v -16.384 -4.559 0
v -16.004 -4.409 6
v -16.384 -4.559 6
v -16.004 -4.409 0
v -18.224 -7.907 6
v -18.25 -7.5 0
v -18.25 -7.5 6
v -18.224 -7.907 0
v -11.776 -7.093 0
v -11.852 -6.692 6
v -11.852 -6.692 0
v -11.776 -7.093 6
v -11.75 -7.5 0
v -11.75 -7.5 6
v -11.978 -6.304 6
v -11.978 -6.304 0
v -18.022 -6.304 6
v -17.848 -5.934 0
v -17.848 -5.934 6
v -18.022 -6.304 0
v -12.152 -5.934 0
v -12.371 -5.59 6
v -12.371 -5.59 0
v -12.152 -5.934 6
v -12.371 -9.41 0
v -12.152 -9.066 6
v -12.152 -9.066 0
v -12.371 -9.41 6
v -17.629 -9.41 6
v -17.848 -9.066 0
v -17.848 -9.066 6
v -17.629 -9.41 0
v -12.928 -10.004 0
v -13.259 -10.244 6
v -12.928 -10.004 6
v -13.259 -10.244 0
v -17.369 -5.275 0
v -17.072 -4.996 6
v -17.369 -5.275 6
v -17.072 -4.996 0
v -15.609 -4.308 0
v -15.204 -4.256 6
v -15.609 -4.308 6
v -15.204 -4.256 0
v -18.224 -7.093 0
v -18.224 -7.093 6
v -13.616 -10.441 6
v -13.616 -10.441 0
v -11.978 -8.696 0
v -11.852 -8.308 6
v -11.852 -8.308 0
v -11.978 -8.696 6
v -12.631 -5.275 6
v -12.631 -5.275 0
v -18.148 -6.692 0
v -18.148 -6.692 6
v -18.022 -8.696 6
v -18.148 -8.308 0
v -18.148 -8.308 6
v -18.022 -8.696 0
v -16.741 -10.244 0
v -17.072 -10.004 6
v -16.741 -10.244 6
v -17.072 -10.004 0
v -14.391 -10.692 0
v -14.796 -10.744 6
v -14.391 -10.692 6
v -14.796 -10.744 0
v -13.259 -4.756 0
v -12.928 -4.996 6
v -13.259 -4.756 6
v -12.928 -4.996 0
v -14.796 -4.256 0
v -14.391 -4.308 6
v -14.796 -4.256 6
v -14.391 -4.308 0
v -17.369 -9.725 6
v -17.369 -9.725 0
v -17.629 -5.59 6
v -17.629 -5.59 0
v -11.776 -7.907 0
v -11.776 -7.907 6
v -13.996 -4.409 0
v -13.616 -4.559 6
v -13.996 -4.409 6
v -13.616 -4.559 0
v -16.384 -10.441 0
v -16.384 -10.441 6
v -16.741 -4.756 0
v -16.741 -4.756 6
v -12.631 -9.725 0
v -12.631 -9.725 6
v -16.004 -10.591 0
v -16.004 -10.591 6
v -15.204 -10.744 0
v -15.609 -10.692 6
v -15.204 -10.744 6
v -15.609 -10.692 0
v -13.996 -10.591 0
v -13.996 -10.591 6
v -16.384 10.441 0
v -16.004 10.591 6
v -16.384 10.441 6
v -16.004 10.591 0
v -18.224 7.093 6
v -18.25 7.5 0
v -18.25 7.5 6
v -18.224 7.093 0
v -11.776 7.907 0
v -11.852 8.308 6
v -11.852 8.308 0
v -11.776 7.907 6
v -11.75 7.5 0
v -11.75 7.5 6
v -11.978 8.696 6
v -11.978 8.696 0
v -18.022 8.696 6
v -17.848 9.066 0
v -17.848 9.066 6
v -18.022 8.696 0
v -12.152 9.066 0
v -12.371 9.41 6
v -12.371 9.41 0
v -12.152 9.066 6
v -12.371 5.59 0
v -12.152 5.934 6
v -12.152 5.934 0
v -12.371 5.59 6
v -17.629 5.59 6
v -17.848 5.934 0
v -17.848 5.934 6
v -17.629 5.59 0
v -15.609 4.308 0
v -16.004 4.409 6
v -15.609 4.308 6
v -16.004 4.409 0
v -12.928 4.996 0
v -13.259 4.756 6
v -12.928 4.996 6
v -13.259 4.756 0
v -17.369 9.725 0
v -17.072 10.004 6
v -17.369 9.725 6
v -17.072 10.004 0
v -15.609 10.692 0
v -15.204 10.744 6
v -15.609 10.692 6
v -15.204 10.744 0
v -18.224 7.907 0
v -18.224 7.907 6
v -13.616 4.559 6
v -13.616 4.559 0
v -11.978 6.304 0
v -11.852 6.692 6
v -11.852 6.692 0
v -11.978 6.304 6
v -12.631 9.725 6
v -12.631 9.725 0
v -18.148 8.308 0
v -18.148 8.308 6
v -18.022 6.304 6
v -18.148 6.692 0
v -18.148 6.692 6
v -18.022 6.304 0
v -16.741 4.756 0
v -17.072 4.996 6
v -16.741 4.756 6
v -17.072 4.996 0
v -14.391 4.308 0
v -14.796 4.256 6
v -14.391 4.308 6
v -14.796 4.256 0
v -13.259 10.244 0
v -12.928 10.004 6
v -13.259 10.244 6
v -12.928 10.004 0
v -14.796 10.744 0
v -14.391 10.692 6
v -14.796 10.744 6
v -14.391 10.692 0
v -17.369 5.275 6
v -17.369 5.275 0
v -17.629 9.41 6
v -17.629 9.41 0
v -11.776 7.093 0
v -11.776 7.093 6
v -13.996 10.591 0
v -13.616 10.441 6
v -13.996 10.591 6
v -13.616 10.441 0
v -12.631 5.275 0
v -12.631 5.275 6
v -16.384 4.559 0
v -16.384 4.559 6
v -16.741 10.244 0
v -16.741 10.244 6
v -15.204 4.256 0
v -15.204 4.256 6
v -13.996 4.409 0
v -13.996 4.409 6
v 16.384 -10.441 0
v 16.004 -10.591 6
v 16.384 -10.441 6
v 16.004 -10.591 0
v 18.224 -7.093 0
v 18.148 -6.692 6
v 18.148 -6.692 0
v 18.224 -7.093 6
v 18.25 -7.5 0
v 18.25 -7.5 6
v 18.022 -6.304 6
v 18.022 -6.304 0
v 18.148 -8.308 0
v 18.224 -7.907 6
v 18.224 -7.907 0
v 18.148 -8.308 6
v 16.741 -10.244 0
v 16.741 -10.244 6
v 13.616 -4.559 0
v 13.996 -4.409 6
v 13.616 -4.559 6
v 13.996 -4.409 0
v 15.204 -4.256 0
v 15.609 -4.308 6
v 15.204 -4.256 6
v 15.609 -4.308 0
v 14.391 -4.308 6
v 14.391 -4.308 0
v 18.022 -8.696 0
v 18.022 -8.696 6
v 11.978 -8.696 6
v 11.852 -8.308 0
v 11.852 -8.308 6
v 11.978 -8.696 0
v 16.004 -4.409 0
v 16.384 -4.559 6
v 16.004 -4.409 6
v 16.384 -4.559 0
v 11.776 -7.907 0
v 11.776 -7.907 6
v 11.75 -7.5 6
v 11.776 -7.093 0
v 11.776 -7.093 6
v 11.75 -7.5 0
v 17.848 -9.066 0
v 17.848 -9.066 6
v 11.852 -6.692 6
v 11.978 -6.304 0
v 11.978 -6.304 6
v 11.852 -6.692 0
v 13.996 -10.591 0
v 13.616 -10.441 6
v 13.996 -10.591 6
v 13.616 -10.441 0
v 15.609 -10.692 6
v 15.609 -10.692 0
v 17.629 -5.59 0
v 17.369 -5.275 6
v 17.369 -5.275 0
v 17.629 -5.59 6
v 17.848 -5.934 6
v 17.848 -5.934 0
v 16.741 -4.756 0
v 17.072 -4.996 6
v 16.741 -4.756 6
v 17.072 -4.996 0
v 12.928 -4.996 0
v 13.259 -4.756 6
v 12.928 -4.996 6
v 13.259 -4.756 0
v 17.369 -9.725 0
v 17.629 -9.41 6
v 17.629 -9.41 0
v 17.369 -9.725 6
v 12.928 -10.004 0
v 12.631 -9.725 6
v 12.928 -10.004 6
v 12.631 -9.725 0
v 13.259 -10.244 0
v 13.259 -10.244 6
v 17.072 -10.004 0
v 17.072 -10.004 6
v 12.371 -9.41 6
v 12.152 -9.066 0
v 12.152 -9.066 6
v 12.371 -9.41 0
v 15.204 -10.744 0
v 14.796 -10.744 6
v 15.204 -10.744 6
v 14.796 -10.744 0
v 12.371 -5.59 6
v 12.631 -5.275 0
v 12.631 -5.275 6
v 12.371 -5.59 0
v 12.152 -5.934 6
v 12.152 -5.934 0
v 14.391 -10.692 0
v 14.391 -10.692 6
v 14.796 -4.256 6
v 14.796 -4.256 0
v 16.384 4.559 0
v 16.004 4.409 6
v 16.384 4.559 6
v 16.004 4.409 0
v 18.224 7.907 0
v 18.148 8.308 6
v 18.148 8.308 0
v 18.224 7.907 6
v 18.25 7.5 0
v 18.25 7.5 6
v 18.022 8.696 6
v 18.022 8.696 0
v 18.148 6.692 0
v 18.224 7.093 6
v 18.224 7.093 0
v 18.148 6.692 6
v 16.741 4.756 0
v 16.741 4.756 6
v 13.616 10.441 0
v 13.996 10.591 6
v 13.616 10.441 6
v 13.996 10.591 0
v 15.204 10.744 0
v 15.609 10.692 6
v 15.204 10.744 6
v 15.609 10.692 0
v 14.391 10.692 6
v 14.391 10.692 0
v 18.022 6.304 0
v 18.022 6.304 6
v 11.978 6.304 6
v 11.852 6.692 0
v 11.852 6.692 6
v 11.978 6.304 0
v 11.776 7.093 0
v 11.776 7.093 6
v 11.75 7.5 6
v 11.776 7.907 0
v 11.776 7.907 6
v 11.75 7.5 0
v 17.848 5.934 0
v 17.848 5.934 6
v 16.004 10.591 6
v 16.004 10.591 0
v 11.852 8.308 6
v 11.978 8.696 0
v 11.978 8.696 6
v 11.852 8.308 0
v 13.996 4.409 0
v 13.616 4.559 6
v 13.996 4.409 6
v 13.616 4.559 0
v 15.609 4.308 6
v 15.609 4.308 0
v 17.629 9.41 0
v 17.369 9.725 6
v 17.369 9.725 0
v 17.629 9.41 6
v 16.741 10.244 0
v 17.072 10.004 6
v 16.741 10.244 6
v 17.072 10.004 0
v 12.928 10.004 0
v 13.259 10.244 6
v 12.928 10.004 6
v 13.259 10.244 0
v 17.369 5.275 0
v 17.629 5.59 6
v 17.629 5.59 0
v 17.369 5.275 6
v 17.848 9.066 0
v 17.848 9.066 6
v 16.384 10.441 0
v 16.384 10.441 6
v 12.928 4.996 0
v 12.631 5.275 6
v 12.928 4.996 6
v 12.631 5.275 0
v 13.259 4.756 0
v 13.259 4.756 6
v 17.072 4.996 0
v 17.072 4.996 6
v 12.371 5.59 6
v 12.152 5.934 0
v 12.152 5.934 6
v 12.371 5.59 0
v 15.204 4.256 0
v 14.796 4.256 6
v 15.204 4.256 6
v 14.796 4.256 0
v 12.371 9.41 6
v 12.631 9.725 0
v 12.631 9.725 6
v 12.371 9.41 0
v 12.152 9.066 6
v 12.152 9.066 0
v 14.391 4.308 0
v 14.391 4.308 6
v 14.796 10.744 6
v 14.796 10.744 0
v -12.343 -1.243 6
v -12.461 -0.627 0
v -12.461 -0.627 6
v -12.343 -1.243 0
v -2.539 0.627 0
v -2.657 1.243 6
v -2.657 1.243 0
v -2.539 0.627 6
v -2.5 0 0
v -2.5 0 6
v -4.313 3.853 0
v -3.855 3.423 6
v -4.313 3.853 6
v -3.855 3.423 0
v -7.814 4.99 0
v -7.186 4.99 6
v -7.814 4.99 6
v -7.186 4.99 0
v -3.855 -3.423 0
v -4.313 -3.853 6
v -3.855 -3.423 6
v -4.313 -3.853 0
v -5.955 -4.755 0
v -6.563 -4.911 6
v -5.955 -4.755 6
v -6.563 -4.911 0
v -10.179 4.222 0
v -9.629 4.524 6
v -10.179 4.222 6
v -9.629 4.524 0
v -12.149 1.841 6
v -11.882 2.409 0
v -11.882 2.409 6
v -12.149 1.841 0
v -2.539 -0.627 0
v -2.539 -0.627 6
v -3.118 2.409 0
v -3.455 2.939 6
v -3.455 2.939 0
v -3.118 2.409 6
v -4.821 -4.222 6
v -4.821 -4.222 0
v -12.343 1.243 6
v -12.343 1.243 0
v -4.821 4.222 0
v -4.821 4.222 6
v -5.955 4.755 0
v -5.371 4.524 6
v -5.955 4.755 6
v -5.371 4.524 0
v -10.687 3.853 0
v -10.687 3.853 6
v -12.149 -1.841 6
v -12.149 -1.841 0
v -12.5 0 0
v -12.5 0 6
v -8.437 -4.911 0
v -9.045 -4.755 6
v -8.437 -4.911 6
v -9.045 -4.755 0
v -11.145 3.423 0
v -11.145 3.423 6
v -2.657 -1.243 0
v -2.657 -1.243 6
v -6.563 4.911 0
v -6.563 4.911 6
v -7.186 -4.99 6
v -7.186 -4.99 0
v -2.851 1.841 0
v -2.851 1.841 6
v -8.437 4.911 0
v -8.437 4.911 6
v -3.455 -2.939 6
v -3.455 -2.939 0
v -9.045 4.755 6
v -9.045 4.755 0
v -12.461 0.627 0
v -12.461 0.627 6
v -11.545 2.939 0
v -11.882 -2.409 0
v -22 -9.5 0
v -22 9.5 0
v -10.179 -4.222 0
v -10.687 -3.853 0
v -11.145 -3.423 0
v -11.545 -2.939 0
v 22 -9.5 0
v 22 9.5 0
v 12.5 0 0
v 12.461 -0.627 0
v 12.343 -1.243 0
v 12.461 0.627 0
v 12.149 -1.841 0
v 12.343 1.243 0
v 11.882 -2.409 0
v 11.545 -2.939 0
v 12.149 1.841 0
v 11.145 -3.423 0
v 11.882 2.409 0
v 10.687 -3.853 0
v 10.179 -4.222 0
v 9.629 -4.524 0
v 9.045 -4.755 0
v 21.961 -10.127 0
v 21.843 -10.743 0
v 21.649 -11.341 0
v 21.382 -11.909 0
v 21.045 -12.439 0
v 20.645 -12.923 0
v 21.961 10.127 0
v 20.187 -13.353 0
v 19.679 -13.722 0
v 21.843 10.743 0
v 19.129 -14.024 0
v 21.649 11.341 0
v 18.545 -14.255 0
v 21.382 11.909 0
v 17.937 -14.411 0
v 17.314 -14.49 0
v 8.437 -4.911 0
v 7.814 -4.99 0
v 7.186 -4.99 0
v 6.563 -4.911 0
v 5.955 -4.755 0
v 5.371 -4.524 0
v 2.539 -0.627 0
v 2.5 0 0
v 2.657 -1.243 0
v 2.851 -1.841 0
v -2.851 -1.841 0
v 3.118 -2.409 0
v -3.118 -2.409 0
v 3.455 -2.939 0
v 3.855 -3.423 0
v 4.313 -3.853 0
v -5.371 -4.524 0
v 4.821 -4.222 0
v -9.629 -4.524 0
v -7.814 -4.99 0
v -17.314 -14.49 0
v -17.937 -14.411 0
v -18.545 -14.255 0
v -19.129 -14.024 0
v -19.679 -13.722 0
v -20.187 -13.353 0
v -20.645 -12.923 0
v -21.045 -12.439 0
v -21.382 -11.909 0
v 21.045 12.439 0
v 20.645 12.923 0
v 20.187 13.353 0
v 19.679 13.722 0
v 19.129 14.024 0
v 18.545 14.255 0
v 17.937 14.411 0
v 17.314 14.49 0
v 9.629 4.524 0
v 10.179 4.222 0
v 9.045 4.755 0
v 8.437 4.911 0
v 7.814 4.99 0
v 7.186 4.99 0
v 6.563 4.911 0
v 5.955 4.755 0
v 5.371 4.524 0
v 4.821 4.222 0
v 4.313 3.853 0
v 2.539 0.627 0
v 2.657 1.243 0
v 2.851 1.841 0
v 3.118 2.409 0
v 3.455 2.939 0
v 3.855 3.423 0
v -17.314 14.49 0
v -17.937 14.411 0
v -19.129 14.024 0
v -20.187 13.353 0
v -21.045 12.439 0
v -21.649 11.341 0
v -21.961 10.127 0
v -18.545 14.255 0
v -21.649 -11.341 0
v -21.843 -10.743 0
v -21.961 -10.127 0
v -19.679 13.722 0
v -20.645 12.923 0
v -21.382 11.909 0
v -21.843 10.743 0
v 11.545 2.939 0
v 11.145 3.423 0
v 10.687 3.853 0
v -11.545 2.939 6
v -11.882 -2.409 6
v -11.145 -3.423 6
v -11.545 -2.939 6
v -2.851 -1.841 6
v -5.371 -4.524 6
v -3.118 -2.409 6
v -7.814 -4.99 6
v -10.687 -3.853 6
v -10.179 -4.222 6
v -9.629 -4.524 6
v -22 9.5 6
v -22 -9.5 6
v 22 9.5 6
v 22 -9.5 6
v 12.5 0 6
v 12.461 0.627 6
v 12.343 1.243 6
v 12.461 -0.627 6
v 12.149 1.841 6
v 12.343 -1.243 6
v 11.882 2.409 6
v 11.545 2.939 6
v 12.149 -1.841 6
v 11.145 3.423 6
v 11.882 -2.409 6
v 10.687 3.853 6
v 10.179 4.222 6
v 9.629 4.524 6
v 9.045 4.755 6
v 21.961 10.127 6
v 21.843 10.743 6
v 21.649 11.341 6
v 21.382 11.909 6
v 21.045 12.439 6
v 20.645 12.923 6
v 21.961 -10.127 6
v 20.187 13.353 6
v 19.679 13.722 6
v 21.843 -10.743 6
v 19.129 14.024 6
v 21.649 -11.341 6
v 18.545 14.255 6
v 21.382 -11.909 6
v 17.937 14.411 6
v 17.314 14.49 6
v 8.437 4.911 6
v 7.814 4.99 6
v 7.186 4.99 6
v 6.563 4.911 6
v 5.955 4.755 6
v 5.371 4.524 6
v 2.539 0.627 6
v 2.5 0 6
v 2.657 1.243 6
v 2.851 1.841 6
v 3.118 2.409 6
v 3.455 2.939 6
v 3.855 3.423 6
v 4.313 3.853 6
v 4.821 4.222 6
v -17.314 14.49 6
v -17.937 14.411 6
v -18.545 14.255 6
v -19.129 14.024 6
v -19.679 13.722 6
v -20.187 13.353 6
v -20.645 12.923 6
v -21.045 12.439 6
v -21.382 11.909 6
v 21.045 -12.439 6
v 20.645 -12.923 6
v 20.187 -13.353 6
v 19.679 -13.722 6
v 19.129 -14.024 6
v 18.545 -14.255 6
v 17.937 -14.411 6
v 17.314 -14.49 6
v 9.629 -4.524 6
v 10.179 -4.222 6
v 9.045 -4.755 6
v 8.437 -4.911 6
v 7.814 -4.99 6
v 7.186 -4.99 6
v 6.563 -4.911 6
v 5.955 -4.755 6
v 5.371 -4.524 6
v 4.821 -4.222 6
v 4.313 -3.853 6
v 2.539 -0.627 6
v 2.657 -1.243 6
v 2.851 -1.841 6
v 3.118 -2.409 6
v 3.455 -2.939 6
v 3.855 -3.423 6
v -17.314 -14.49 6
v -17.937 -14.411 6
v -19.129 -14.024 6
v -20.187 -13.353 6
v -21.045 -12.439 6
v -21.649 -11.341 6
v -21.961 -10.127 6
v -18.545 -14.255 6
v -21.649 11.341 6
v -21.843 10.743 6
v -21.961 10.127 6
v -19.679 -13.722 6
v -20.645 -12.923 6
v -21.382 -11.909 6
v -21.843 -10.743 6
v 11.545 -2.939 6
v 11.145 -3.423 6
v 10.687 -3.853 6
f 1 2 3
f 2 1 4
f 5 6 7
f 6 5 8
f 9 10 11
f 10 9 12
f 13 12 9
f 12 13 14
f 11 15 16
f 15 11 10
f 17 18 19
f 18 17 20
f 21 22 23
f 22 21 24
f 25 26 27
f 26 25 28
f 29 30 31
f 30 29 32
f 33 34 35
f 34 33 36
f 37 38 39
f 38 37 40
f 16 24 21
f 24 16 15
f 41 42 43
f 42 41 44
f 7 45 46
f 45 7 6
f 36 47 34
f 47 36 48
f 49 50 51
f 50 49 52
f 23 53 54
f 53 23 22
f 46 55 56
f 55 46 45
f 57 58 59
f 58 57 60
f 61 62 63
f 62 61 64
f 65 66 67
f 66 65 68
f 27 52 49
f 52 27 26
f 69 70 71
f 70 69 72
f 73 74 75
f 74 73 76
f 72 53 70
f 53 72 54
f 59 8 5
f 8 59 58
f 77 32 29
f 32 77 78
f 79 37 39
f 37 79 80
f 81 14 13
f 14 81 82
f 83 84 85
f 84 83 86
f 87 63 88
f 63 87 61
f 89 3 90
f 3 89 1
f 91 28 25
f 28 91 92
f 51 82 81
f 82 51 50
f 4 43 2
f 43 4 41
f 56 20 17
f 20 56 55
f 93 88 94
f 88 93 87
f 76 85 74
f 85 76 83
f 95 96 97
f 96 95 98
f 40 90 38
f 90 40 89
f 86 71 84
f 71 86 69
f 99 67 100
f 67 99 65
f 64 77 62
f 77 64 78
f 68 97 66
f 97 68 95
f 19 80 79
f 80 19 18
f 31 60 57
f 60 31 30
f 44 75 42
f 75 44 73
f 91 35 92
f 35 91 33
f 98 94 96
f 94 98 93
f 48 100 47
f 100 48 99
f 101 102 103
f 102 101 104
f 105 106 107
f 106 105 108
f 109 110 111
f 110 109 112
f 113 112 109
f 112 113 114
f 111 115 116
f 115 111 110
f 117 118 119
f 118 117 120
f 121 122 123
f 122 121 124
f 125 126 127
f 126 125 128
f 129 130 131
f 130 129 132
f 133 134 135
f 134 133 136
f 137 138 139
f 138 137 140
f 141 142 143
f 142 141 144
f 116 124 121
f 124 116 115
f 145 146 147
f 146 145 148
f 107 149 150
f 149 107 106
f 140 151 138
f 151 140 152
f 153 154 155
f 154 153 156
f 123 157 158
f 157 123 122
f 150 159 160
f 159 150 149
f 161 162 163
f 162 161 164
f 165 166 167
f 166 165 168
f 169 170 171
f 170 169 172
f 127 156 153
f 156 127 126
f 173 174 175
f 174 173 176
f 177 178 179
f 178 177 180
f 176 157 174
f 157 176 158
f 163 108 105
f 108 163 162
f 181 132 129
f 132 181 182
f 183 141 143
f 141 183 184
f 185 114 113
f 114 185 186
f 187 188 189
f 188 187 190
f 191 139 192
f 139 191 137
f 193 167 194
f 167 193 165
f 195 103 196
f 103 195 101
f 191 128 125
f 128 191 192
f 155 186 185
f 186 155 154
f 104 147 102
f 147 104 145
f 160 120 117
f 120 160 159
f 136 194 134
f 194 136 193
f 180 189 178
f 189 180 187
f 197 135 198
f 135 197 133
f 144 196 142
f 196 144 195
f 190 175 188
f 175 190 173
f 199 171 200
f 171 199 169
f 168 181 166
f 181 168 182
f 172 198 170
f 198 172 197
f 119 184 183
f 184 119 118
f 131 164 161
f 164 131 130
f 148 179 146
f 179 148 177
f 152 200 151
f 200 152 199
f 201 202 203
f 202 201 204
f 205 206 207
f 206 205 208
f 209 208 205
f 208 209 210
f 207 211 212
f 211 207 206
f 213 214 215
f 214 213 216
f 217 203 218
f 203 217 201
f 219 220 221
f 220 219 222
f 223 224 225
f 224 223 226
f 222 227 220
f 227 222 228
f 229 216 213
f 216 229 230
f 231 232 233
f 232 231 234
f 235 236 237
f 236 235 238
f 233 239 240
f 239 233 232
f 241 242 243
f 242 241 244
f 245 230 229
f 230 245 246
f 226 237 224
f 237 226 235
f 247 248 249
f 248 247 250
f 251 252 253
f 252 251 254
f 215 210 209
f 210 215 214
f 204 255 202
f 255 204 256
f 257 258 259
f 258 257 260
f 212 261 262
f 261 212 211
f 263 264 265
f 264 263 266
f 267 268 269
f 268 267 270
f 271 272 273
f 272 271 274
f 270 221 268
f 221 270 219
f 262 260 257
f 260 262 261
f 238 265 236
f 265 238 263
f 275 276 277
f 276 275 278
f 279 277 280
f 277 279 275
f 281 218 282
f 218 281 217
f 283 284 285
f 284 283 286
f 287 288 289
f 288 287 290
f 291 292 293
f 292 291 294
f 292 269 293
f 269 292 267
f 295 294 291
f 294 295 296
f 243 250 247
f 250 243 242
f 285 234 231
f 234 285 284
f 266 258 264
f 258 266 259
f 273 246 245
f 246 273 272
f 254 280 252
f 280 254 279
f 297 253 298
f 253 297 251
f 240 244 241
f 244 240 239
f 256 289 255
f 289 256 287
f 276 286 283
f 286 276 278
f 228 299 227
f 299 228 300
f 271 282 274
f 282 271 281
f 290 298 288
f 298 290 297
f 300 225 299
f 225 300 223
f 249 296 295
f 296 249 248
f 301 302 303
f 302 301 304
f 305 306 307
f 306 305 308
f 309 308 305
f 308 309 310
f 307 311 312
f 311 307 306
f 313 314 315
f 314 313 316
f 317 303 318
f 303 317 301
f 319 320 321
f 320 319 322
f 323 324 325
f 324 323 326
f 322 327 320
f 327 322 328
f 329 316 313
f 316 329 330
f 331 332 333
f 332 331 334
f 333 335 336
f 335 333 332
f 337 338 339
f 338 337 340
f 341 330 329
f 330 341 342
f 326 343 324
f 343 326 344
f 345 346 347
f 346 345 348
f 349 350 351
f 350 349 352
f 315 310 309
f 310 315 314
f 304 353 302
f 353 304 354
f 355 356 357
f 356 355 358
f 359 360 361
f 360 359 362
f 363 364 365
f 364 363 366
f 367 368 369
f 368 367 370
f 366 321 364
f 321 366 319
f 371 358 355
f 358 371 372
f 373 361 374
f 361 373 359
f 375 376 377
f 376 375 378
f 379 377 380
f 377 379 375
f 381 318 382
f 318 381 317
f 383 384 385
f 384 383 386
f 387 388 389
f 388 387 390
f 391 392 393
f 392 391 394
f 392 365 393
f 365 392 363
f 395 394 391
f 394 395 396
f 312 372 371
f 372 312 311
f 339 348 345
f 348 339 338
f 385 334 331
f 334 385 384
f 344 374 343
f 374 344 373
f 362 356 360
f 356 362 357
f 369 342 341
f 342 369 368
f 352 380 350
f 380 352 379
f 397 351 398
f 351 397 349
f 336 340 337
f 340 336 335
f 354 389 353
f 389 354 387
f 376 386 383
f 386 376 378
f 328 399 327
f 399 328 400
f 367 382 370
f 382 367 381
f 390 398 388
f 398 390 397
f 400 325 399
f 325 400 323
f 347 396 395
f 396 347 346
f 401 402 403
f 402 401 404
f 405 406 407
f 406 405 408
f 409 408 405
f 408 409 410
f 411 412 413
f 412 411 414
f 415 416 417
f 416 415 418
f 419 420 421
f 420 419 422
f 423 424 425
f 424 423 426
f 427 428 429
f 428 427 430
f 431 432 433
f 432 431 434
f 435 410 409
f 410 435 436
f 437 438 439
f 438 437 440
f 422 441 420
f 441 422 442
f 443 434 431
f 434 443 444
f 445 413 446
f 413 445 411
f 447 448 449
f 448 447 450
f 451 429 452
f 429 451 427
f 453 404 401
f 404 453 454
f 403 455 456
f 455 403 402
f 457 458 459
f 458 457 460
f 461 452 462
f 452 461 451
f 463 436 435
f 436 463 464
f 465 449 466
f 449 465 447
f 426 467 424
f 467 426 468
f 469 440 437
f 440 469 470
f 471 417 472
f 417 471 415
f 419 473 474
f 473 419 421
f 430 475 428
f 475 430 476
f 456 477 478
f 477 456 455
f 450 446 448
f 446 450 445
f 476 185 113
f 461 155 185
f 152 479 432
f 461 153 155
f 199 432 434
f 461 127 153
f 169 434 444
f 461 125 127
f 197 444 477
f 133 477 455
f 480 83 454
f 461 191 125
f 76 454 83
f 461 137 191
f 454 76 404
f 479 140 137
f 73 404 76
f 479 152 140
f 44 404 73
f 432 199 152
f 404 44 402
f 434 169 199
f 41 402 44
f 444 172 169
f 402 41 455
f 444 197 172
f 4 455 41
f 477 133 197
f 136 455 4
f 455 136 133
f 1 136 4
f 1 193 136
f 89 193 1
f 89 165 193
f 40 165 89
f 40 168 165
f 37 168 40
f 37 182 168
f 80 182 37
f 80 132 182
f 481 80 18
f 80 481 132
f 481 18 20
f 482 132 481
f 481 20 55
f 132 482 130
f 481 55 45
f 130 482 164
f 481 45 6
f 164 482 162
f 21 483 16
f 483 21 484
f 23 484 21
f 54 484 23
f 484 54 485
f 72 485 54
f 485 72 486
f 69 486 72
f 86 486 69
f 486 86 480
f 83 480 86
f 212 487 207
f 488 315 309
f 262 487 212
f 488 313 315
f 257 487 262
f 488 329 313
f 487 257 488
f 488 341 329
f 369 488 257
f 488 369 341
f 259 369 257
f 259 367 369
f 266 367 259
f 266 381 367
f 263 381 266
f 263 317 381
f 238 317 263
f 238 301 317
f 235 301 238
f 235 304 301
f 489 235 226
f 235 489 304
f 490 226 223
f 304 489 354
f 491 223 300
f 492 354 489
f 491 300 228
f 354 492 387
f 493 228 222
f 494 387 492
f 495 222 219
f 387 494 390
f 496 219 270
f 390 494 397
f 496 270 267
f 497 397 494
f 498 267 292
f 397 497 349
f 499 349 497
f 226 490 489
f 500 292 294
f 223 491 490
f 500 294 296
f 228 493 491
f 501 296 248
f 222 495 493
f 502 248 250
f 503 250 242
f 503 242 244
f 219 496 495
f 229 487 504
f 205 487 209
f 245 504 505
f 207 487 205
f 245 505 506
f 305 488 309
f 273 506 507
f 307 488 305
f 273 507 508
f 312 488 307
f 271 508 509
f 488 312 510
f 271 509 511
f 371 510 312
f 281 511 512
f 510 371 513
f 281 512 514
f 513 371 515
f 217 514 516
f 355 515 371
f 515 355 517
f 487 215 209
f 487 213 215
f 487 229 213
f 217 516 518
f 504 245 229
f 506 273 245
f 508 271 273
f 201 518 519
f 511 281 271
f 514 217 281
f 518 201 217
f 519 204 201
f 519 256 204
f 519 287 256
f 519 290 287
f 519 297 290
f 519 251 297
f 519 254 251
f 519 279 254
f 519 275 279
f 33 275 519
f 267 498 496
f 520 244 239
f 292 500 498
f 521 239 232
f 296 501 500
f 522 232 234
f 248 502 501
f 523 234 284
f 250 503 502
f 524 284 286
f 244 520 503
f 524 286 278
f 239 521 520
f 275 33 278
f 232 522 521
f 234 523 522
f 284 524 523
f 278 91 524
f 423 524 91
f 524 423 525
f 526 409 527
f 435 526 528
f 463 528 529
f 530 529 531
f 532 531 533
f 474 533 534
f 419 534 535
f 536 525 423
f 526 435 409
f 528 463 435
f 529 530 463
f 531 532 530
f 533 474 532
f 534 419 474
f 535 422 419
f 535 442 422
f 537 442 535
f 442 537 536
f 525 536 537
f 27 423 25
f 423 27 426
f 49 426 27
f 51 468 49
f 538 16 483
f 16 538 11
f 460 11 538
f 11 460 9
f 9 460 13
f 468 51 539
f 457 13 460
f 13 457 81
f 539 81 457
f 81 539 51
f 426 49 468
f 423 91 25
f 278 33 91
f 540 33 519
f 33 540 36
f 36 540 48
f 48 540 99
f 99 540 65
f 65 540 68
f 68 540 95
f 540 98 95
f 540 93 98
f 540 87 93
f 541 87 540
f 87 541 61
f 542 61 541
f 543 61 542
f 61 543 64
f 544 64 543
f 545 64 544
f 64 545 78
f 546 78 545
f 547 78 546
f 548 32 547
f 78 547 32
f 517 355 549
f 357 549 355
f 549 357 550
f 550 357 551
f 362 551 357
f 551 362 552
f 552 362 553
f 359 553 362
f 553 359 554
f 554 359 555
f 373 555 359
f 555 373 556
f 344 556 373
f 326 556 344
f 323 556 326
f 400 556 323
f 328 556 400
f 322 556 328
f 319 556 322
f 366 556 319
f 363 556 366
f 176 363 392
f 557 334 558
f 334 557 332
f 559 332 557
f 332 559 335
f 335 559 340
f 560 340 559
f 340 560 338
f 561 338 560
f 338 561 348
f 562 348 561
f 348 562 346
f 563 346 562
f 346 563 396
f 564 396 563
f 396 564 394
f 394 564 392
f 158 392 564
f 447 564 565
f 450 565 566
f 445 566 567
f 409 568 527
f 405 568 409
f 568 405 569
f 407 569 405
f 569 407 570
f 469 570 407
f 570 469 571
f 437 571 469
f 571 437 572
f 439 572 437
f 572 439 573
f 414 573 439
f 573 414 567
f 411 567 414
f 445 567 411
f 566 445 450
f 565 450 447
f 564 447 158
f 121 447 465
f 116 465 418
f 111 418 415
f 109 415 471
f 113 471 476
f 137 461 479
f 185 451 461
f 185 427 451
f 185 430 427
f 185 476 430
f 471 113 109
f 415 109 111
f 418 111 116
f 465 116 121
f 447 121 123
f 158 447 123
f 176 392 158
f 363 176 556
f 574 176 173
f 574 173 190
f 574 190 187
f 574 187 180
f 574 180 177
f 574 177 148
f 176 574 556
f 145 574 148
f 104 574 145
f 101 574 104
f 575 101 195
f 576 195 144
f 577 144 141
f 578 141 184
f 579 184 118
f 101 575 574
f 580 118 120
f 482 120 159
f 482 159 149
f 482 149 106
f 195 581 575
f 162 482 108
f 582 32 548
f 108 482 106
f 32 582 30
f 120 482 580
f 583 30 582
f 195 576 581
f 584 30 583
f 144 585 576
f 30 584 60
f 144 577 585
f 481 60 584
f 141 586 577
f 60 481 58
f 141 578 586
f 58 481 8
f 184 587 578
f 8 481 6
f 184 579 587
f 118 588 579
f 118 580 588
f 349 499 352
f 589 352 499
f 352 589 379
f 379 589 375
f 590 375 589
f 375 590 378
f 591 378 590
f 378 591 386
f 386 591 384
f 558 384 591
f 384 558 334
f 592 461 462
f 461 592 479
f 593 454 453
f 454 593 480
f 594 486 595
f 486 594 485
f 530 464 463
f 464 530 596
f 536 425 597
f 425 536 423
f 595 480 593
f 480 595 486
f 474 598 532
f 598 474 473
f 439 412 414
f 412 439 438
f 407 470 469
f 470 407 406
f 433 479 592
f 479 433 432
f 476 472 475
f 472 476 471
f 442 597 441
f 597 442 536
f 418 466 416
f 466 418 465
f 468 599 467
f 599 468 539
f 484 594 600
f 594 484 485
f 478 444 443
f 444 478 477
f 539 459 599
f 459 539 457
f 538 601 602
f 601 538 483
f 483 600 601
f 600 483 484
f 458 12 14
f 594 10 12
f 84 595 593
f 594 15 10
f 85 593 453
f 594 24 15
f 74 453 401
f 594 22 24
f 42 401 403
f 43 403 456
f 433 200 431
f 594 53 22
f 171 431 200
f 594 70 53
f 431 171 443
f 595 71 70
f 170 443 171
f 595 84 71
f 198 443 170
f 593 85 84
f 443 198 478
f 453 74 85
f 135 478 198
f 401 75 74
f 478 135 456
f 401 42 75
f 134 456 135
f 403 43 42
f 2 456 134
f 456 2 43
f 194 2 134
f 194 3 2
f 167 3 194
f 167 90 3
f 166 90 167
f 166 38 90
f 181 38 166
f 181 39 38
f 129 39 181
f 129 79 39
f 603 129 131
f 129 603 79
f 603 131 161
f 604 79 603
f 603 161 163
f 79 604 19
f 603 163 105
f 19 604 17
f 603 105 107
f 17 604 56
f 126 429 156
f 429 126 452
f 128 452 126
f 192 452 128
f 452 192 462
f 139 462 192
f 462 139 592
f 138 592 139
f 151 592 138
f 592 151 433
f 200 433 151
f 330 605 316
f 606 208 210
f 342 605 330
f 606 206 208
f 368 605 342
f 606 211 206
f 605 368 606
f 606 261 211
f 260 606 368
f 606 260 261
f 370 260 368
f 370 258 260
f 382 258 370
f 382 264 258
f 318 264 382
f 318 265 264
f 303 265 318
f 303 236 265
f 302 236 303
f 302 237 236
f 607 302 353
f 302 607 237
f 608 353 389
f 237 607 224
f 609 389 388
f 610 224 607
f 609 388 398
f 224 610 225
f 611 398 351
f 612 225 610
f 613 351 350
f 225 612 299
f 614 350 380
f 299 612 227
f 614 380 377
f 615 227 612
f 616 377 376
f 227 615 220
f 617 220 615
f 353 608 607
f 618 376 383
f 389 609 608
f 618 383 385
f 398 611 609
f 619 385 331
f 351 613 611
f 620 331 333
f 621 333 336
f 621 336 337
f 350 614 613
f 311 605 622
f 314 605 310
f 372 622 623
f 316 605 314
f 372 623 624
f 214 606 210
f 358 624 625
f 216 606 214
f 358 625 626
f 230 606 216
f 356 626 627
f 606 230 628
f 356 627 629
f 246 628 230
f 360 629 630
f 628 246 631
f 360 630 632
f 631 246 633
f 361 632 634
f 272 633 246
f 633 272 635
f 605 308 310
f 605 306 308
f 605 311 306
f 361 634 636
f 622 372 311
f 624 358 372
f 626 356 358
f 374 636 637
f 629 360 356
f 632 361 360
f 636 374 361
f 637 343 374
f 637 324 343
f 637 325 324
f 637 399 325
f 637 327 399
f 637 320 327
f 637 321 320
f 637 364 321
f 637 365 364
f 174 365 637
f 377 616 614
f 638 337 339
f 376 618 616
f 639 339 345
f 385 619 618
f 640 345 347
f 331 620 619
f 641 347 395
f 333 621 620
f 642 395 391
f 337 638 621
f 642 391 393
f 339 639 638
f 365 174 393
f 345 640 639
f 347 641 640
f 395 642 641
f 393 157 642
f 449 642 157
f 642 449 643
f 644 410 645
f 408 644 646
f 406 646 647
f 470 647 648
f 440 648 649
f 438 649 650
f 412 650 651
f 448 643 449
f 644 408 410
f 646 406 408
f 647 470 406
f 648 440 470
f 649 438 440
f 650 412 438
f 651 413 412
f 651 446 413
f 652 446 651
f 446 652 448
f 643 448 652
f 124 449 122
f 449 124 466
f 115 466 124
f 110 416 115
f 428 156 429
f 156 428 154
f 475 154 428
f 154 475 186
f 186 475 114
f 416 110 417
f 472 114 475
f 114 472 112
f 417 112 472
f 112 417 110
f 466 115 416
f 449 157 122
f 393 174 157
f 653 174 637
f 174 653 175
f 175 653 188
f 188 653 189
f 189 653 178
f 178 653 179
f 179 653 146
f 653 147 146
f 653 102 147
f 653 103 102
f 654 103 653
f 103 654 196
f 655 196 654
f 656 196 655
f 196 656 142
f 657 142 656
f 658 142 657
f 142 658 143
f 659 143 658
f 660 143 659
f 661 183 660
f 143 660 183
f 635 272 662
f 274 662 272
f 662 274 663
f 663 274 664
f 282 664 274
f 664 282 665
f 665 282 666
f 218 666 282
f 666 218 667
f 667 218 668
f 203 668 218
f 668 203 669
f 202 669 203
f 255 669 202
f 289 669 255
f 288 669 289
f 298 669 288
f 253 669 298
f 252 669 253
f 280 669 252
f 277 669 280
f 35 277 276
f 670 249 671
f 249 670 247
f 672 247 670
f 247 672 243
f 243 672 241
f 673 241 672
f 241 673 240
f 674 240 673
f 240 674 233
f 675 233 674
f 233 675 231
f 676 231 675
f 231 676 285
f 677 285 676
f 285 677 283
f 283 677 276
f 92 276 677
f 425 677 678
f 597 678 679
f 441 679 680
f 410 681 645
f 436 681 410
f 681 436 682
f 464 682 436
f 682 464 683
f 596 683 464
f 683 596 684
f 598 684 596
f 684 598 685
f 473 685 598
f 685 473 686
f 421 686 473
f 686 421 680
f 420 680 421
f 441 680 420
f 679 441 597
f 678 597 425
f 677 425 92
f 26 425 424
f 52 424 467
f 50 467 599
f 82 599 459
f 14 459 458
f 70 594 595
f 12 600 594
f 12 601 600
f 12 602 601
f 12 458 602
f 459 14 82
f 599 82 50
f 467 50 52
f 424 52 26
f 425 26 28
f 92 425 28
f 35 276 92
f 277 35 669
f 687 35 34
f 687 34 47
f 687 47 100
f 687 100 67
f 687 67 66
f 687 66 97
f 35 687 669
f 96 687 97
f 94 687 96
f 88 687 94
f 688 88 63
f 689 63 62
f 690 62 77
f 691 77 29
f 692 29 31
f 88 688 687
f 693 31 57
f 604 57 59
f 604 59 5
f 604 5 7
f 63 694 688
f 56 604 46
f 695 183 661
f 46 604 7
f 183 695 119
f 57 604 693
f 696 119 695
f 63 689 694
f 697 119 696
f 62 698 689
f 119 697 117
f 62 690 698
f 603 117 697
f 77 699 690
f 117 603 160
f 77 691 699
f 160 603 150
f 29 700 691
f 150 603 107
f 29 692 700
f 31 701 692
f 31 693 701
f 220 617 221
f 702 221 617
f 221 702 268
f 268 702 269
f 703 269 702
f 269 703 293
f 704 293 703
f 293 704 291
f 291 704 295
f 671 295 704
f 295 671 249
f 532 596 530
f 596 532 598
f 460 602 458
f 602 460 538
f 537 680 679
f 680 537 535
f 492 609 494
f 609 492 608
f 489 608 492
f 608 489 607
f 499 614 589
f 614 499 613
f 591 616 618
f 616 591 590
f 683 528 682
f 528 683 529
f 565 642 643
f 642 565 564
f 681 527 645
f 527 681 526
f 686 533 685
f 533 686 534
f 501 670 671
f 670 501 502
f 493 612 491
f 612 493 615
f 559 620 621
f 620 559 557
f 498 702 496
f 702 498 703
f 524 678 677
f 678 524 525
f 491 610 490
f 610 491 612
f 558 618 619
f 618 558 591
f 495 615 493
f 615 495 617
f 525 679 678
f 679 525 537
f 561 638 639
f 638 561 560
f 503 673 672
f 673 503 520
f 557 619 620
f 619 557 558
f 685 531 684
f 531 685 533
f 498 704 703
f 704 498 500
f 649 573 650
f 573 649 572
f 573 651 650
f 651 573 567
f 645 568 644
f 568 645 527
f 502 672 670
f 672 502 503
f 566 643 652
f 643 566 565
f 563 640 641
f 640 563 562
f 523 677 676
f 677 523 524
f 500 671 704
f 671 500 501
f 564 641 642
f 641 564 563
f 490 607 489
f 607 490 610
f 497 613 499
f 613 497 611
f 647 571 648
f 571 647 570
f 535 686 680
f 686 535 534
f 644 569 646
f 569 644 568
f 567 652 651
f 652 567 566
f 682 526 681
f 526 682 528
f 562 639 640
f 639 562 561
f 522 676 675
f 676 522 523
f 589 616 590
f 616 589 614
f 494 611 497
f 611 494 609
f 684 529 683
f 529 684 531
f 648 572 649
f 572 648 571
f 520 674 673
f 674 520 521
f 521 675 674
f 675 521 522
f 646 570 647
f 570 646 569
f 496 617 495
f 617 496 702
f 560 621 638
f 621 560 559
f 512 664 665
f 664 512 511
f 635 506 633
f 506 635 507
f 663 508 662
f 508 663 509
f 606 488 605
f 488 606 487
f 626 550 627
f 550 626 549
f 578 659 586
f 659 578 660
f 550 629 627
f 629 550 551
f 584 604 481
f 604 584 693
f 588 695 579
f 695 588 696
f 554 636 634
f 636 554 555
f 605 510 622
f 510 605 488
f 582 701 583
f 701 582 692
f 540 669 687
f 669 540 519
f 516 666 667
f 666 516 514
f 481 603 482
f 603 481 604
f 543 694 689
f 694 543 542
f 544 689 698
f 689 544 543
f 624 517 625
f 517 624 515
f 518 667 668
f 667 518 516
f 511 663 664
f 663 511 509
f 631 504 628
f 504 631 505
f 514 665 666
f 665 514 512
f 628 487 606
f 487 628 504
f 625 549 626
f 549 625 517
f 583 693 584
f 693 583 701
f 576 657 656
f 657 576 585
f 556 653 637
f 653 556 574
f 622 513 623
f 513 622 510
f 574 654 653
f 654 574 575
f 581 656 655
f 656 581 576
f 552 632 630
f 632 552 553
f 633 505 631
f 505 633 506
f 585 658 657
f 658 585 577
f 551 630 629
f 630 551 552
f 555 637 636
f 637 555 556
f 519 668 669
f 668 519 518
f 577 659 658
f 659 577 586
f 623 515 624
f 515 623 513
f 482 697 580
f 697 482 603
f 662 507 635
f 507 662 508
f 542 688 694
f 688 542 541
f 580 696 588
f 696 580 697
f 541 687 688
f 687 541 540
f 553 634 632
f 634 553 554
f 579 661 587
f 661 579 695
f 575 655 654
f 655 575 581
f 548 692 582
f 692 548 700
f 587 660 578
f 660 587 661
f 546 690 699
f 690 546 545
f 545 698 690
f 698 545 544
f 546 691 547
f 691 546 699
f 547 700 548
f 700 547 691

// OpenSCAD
$fn = 50;


difference() {
	union() {
		hull() {
			translate(v = [-17.0000000000, 9.5000000000, 0]) {
				cylinder(h = 6, r = 5);
			}
			translate(v = [17.0000000000, 9.5000000000, 0]) {
				cylinder(h = 6, r = 5);
			}
			translate(v = [-17.0000000000, -9.5000000000, 0]) {
				cylinder(h = 6, r = 5);
			}
			translate(v = [17.0000000000, -9.5000000000, 0]) {
				cylinder(h = 6, r = 5);
			}
		}
	}
	union() {
		#translate(v = [-15.0000000000, -7.5000000000, -100.0000000000]) {
			cylinder(h = 200, r = 3.2500000000);
		}
		#translate(v = [-15.0000000000, 7.5000000000, -100.0000000000]) {
			cylinder(h = 200, r = 3.2500000000);
		}
		#translate(v = [15.0000000000, -7.5000000000, -100.0000000000]) {
			cylinder(h = 200, r = 3.2500000000);
		}
		#translate(v = [15.0000000000, 7.5000000000, -100.0000000000]) {
			cylinder(h = 200, r = 3.2500000000);
		}
		#translate(v = [-7.5000000000, 0, 0]) {
			cylinder(h = 6, r = 5.0000000000);
		}
		#translate(v = [7.5000000000, 0, 0]) {
			cylinder(h = 6, r = 5.0000000000);
		}
	}
}
